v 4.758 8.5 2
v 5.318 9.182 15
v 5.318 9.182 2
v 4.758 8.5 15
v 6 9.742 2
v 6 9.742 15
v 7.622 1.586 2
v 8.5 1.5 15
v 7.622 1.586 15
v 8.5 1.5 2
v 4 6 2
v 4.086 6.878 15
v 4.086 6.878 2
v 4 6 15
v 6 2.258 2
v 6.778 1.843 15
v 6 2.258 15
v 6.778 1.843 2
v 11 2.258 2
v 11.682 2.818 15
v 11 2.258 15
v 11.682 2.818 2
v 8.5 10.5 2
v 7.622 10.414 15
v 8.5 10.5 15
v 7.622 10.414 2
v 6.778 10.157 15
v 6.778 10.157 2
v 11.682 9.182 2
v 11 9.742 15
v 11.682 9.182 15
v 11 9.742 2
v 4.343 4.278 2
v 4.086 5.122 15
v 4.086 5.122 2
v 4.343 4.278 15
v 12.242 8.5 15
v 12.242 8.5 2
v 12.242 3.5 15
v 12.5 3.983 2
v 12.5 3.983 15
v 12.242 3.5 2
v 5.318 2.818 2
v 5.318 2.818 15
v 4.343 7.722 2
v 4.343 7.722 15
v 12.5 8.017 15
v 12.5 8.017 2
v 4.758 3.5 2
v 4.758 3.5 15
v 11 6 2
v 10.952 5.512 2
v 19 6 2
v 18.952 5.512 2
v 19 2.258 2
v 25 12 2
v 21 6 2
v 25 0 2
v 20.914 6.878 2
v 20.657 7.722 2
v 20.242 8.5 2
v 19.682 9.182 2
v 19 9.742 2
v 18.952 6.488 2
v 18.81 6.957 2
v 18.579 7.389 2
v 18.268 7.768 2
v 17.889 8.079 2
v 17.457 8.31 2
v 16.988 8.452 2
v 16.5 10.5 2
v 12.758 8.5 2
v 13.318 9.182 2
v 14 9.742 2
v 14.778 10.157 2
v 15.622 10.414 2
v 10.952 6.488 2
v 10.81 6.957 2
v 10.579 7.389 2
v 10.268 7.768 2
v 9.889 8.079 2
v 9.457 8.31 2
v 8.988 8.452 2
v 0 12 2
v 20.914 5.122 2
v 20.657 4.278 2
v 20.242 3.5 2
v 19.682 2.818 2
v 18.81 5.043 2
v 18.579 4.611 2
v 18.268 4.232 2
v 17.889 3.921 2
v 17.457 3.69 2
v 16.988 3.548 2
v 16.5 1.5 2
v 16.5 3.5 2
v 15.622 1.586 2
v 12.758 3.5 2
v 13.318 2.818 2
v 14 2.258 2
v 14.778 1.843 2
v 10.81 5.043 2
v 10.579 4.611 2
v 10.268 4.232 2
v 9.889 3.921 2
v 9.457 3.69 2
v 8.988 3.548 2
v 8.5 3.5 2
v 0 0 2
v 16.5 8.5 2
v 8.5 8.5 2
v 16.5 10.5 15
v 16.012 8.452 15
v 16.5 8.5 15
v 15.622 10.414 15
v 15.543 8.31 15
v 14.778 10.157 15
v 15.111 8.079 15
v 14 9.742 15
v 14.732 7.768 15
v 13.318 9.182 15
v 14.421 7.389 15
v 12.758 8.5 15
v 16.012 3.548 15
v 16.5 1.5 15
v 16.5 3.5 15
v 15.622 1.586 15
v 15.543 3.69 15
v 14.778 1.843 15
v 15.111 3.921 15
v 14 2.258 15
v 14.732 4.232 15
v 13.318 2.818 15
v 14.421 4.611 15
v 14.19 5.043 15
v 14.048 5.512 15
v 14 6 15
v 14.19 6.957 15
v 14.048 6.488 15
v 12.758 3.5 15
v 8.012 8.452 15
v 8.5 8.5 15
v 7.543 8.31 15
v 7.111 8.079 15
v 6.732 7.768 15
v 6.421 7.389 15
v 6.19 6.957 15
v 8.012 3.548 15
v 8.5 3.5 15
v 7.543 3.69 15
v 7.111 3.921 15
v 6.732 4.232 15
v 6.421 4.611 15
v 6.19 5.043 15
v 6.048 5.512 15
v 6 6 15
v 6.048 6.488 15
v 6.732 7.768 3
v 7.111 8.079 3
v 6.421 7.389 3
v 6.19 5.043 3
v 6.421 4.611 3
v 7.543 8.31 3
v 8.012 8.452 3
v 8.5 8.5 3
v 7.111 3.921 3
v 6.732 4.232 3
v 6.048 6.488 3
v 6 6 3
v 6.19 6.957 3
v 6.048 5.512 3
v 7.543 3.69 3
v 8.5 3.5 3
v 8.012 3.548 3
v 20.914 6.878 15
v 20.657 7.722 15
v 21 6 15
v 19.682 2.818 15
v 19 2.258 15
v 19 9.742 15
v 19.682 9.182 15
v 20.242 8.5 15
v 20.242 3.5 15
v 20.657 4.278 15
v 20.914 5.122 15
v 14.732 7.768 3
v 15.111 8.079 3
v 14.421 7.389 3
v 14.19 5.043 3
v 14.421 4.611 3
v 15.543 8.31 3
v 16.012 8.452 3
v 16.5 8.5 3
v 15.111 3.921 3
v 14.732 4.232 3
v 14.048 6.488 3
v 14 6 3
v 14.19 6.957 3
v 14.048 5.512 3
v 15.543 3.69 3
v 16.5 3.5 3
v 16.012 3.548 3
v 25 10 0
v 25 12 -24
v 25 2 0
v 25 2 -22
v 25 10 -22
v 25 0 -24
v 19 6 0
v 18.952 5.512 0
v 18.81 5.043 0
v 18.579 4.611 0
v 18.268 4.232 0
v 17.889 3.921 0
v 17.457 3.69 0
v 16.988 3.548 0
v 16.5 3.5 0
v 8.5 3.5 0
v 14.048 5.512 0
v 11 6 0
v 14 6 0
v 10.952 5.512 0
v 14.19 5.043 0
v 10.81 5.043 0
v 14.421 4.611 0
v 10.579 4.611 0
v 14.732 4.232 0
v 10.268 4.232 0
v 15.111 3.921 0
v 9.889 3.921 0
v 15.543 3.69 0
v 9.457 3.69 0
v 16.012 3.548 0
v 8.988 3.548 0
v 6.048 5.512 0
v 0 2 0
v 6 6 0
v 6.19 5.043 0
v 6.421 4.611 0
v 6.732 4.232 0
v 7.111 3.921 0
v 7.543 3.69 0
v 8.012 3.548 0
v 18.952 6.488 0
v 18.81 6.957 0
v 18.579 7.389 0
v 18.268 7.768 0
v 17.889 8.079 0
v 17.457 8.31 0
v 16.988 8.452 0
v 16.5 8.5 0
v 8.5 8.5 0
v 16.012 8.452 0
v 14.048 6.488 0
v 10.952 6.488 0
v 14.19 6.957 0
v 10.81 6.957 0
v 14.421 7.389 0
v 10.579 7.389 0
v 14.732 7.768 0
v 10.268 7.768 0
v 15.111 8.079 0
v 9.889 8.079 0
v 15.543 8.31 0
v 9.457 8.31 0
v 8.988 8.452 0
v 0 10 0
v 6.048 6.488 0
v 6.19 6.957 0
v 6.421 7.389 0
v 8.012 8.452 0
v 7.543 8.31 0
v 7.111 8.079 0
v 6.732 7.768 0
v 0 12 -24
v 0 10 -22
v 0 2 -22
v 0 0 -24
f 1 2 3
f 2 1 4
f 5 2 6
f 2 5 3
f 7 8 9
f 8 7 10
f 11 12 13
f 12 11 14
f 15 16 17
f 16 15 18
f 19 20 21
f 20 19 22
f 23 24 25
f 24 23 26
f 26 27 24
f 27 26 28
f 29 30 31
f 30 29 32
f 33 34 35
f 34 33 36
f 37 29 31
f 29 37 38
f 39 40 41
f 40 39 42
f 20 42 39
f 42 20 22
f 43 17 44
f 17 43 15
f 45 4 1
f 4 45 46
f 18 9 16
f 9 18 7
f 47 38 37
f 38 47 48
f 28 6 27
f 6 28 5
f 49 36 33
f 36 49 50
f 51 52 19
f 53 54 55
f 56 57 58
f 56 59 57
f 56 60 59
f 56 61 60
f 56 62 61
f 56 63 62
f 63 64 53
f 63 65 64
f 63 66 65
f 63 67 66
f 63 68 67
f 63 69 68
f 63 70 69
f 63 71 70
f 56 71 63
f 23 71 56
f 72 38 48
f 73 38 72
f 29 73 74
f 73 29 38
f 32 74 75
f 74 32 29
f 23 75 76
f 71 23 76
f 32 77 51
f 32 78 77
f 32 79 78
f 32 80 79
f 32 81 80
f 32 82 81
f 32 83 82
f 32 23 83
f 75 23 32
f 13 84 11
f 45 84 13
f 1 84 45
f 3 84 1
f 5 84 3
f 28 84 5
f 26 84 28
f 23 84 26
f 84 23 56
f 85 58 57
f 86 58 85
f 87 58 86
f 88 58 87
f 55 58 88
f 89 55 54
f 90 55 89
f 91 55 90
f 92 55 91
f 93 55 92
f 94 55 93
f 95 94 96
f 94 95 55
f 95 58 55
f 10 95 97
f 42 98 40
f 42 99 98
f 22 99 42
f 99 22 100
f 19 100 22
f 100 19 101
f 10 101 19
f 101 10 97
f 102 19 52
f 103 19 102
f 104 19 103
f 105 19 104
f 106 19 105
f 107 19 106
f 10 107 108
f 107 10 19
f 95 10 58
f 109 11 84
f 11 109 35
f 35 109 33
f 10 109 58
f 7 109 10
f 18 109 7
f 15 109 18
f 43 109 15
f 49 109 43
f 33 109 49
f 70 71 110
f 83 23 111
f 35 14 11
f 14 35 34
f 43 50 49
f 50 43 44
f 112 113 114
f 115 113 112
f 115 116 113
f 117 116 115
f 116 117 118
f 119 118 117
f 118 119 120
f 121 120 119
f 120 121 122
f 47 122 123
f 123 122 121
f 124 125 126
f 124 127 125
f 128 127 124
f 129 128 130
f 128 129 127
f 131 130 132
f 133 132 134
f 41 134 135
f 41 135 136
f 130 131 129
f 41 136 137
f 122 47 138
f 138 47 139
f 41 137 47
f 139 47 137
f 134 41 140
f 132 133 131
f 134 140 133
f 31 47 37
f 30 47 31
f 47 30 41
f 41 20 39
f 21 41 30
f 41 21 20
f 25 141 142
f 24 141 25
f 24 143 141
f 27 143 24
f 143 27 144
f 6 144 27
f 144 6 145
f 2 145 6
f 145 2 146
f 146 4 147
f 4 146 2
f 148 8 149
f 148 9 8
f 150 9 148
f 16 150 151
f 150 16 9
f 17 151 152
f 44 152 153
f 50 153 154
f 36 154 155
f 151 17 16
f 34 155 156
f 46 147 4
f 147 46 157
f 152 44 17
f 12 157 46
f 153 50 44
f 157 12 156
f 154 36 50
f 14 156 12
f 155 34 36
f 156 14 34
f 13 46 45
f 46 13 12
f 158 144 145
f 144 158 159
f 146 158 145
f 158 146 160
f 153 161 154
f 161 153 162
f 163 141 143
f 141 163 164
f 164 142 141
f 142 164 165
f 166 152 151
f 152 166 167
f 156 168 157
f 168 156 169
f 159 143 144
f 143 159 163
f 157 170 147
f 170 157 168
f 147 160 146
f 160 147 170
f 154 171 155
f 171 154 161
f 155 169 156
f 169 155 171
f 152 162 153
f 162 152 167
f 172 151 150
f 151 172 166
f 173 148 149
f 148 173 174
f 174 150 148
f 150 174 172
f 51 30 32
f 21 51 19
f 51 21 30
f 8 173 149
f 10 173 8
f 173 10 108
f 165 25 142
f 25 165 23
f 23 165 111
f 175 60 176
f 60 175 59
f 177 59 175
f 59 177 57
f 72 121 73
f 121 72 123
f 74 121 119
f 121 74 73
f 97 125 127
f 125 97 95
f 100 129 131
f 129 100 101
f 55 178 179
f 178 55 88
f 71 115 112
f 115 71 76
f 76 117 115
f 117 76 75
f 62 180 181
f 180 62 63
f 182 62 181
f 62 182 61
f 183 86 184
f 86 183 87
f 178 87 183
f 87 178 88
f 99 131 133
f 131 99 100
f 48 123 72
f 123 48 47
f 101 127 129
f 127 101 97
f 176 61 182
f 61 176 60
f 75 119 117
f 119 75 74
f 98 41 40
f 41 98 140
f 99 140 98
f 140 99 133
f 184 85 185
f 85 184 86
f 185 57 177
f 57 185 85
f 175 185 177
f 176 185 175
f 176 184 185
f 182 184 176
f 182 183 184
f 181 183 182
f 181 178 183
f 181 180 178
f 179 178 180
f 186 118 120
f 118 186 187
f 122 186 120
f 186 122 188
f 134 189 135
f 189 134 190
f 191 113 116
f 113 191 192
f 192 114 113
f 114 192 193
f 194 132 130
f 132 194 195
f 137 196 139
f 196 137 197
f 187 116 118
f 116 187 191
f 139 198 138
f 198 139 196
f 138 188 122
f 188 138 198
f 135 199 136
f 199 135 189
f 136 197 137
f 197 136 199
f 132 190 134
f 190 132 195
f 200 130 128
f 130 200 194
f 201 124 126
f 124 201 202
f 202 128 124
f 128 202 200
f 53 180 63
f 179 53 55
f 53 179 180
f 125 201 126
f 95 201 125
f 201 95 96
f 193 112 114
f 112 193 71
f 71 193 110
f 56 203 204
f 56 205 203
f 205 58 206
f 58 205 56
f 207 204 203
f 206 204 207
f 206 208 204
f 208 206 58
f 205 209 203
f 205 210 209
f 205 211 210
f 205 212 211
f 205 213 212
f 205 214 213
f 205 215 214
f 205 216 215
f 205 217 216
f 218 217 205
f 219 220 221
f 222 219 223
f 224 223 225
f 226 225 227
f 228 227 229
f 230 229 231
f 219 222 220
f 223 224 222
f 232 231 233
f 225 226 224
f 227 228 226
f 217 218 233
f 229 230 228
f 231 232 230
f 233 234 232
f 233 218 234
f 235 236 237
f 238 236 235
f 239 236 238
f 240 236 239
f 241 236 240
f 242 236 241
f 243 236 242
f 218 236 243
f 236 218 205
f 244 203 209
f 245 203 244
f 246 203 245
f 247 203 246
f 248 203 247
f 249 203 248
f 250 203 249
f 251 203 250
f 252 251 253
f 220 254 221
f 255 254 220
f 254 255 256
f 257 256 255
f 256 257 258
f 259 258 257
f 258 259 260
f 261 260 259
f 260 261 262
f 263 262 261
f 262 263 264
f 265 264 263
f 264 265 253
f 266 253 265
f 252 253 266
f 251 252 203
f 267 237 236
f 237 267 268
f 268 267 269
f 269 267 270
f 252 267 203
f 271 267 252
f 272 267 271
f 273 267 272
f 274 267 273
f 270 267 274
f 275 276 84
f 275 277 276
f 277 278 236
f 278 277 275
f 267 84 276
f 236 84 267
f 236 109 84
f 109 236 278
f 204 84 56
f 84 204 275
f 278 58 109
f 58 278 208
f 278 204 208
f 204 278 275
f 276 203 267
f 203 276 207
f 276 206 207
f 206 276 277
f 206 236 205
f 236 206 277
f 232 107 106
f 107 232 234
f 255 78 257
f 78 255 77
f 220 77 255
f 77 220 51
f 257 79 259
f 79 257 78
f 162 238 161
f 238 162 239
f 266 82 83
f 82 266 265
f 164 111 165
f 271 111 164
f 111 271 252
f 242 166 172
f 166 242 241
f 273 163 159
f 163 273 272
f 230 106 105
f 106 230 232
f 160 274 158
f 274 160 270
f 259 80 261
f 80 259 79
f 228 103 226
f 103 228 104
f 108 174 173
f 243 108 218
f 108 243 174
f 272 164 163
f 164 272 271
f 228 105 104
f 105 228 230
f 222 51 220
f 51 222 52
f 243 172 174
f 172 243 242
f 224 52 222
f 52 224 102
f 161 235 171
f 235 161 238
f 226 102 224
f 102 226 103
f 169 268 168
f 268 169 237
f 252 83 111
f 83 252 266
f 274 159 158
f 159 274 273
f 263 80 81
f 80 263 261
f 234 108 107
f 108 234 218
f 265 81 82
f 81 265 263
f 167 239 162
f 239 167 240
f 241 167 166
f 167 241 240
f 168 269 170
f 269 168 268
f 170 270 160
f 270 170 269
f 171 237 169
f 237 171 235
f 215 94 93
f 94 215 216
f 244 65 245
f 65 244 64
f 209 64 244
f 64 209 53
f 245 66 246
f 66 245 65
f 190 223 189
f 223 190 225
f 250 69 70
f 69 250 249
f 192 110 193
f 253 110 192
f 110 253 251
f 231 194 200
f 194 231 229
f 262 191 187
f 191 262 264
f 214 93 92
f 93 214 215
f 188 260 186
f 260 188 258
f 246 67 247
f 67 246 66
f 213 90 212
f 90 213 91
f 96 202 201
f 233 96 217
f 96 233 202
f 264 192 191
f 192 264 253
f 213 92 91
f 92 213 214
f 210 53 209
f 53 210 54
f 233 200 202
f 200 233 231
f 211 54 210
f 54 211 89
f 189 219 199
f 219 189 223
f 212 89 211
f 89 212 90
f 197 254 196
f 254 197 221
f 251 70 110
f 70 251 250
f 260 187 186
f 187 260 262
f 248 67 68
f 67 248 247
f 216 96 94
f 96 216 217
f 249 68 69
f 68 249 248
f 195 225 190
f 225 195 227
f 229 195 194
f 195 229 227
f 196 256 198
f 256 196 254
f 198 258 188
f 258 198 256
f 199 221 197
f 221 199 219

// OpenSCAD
// file: ../lib/validate.scad
// validate.scad — Layer 1 parameter validation library
// Pattern: assert() gates with GATE FAIL: prefix for grep-able error extraction
// Usage: include <lib/validate.scad> then call validate_* modules

// Validate a numeric parameter is within bounds
// Fails with GATE FAIL: prefix and interpolated values
module validate_range(name, value, min_val, max_val) {
    assert(value >= min_val,
        str("GATE FAIL: ", name, "=", value, " < ", min_val, " minimum"));
    assert(value <= max_val,
        str("GATE FAIL: ", name, "=", value, " > ", max_val, " maximum"));
}

// Validate a dimension is positive
module validate_positive(name, value) {
    assert(value > 0,
        str("GATE FAIL: ", name, "=", value, " must be positive"));
}

// Validate wall thickness meets printability minimum
module validate_wall_thickness(name, value, min_wall=0.8) {
    assert(value >= min_wall,
        str("GATE FAIL: ", name, "=", value, "mm < ", min_wall, "mm minimum wall thickness"));
}

// Validate $fn is reasonable for printable curves
module validate_fn(fn_val, min_fn=16, max_fn=256) {
    assert(fn_val >= min_fn,
        str("GATE FAIL: $fn=", fn_val, " < ", min_fn, " (too coarse for printable curves)"));
    assert(fn_val <= max_fn,
        str("GATE FAIL: $fn=", fn_val, " > ", max_fn, " (excessive polygon count)"));
}

// Validate hole diameter is printable
module validate_hole(name, diameter, min_diameter=1.0) {
    assert(diameter >= min_diameter,
        str("GATE FAIL: ", name, "=", diameter, "mm < ", min_diameter, "mm minimum hole diameter"));
}

// Validate that interior space exists (wall doesn't consume entire dimension)
module validate_interior(dim_name, dim_value, wall_name, wall_value) {
    assert(wall_value < dim_value / 2,
        str("GATE FAIL: ", wall_name, "=", wall_value,
            " >= ", dim_name, "/2=", dim_value/2, " (no interior space)"));
}

// Batch validate common bracket/enclosure parameters
// This is the recommended entry point for simple parts
module validate_part(width, height, depth, wall_thickness,
                     fn=32, holes=[], min_wall=0.8) {
    validate_positive("width", width);
    validate_positive("height", height);
    validate_positive("depth", depth);
    validate_wall_thickness("wall_thickness", wall_thickness, min_wall);
    validate_fn(fn);
    validate_interior("width", width, "wall_thickness", wall_thickness);
    validate_interior("depth", depth, "wall_thickness", wall_thickness);

    // Validate each hole diameter if provided
    for (i = [0:len(holes)-1]) {
        validate_hole(str("hole[", i, "]"), holes[i]);
    }
}
// main file
// cable-clip.scad — Desk-mount cable management clip
// Holds 1-3 cables against a desk edge. Snap-fit design.
// Parameters override via: openscad -D 'param=value'

// --- Parameters ---
width = 25;            // mm — clip width along desk edge
height = 15;           // mm — total height above desk
depth = 12;            // mm — front-to-back depth
wall_thickness = 2;    // mm (minimum 0.8mm for FDM)
cable_diameter = 5;    // mm — cable slot diameter
num_slots = 2;         // number of cable slots (1-3)
slot_spacing = 8;      // mm — center-to-center spacing between slots
desk_thickness = 20;   // mm — desk edge thickness for clip
clip_gap = 1.5;        // mm — snap-fit gap (spring open distance)
fn = 32;               // facet count for curves

// --- Layer 1: Parameter Validation ---
use <../lib/validate.scad>

validate_part(width, height, depth, wall_thickness, fn, holes=[cable_diameter]);
validate_range("cable_diameter", cable_diameter, 2, 15);
validate_range("num_slots", num_slots, 1, 3);
validate_range("slot_spacing", slot_spacing, cable_diameter + wall_thickness, width);
validate_range("desk_thickness", desk_thickness, 5, 50);
validate_range("clip_gap", clip_gap, 0.5, 5);
validate_positive("slot_spacing", slot_spacing);

// Ensure slots fit within width
total_slot_width = (num_slots - 1) * slot_spacing + cable_diameter;
assert(total_slot_width <= width - 2 * wall_thickness,
    str("GATE FAIL: total slot width=", total_slot_width,
        "mm > available width=", width - 2 * wall_thickness, "mm"));

// Advisory warnings
if (wall_thickness < 1.2)
    echo("WARN: wall_thickness=", wall_thickness, "mm is thin for snap-fit clips");
if (clip_gap > desk_thickness * 0.15)
    echo("WARN: clip_gap=", clip_gap, "mm may be too loose for desk_thickness=", desk_thickness);
if (fn > 128)
    echo("WARN: $fn=", fn, " will produce high polygon count");

// --- Geometry ---
module cable_clip() {
    clip_depth = desk_thickness + 2 * wall_thickness;

    difference() {
        union() {
            // Main body — top platform
            cube([width, depth, wall_thickness]);

            // Back wall (desk-side)
            translate([0, depth - wall_thickness, -clip_depth])
                cube([width, wall_thickness, clip_depth + wall_thickness]);

            // Bottom grip — U-shaped clip under desk
            translate([0, 0, -clip_depth])
                cube([width, depth, wall_thickness]);

            // Front wall (partial — snap-fit with gap)
            snap_height = clip_depth - clip_gap;
            translate([0, 0, -snap_height])
                cube([width, wall_thickness, snap_height]);

            // Cable retainer bumps on top
            for (i = [0 : num_slots - 1]) {
                slot_x = width / 2 - (num_slots - 1) * slot_spacing / 2 + i * slot_spacing;
                // Semi-circular retainer walls around each slot
                translate([slot_x, depth / 2, wall_thickness])
                    difference() {
                        cylinder(d=cable_diameter + 2 * wall_thickness, h=height - wall_thickness, $fn=fn);
                        cylinder(d=cable_diameter, h=height - wall_thickness + 1, $fn=fn);
                        // Opening for cable insertion (front slot)
                        translate([0, -(cable_diameter + 2 * wall_thickness) / 2, 0])
                            cube([cable_diameter / 2, cable_diameter + 2 * wall_thickness, height], center=false);
                    }
            }
        }

        // Cable slots through top platform
        for (i = [0 : num_slots - 1]) {
            slot_x = width / 2 - (num_slots - 1) * slot_spacing / 2 + i * slot_spacing;
            translate([slot_x, depth / 2, -1])
                cylinder(d=cable_diameter, h=wall_thickness + 2, $fn=fn);
        }
    }
}

cable_clip();
